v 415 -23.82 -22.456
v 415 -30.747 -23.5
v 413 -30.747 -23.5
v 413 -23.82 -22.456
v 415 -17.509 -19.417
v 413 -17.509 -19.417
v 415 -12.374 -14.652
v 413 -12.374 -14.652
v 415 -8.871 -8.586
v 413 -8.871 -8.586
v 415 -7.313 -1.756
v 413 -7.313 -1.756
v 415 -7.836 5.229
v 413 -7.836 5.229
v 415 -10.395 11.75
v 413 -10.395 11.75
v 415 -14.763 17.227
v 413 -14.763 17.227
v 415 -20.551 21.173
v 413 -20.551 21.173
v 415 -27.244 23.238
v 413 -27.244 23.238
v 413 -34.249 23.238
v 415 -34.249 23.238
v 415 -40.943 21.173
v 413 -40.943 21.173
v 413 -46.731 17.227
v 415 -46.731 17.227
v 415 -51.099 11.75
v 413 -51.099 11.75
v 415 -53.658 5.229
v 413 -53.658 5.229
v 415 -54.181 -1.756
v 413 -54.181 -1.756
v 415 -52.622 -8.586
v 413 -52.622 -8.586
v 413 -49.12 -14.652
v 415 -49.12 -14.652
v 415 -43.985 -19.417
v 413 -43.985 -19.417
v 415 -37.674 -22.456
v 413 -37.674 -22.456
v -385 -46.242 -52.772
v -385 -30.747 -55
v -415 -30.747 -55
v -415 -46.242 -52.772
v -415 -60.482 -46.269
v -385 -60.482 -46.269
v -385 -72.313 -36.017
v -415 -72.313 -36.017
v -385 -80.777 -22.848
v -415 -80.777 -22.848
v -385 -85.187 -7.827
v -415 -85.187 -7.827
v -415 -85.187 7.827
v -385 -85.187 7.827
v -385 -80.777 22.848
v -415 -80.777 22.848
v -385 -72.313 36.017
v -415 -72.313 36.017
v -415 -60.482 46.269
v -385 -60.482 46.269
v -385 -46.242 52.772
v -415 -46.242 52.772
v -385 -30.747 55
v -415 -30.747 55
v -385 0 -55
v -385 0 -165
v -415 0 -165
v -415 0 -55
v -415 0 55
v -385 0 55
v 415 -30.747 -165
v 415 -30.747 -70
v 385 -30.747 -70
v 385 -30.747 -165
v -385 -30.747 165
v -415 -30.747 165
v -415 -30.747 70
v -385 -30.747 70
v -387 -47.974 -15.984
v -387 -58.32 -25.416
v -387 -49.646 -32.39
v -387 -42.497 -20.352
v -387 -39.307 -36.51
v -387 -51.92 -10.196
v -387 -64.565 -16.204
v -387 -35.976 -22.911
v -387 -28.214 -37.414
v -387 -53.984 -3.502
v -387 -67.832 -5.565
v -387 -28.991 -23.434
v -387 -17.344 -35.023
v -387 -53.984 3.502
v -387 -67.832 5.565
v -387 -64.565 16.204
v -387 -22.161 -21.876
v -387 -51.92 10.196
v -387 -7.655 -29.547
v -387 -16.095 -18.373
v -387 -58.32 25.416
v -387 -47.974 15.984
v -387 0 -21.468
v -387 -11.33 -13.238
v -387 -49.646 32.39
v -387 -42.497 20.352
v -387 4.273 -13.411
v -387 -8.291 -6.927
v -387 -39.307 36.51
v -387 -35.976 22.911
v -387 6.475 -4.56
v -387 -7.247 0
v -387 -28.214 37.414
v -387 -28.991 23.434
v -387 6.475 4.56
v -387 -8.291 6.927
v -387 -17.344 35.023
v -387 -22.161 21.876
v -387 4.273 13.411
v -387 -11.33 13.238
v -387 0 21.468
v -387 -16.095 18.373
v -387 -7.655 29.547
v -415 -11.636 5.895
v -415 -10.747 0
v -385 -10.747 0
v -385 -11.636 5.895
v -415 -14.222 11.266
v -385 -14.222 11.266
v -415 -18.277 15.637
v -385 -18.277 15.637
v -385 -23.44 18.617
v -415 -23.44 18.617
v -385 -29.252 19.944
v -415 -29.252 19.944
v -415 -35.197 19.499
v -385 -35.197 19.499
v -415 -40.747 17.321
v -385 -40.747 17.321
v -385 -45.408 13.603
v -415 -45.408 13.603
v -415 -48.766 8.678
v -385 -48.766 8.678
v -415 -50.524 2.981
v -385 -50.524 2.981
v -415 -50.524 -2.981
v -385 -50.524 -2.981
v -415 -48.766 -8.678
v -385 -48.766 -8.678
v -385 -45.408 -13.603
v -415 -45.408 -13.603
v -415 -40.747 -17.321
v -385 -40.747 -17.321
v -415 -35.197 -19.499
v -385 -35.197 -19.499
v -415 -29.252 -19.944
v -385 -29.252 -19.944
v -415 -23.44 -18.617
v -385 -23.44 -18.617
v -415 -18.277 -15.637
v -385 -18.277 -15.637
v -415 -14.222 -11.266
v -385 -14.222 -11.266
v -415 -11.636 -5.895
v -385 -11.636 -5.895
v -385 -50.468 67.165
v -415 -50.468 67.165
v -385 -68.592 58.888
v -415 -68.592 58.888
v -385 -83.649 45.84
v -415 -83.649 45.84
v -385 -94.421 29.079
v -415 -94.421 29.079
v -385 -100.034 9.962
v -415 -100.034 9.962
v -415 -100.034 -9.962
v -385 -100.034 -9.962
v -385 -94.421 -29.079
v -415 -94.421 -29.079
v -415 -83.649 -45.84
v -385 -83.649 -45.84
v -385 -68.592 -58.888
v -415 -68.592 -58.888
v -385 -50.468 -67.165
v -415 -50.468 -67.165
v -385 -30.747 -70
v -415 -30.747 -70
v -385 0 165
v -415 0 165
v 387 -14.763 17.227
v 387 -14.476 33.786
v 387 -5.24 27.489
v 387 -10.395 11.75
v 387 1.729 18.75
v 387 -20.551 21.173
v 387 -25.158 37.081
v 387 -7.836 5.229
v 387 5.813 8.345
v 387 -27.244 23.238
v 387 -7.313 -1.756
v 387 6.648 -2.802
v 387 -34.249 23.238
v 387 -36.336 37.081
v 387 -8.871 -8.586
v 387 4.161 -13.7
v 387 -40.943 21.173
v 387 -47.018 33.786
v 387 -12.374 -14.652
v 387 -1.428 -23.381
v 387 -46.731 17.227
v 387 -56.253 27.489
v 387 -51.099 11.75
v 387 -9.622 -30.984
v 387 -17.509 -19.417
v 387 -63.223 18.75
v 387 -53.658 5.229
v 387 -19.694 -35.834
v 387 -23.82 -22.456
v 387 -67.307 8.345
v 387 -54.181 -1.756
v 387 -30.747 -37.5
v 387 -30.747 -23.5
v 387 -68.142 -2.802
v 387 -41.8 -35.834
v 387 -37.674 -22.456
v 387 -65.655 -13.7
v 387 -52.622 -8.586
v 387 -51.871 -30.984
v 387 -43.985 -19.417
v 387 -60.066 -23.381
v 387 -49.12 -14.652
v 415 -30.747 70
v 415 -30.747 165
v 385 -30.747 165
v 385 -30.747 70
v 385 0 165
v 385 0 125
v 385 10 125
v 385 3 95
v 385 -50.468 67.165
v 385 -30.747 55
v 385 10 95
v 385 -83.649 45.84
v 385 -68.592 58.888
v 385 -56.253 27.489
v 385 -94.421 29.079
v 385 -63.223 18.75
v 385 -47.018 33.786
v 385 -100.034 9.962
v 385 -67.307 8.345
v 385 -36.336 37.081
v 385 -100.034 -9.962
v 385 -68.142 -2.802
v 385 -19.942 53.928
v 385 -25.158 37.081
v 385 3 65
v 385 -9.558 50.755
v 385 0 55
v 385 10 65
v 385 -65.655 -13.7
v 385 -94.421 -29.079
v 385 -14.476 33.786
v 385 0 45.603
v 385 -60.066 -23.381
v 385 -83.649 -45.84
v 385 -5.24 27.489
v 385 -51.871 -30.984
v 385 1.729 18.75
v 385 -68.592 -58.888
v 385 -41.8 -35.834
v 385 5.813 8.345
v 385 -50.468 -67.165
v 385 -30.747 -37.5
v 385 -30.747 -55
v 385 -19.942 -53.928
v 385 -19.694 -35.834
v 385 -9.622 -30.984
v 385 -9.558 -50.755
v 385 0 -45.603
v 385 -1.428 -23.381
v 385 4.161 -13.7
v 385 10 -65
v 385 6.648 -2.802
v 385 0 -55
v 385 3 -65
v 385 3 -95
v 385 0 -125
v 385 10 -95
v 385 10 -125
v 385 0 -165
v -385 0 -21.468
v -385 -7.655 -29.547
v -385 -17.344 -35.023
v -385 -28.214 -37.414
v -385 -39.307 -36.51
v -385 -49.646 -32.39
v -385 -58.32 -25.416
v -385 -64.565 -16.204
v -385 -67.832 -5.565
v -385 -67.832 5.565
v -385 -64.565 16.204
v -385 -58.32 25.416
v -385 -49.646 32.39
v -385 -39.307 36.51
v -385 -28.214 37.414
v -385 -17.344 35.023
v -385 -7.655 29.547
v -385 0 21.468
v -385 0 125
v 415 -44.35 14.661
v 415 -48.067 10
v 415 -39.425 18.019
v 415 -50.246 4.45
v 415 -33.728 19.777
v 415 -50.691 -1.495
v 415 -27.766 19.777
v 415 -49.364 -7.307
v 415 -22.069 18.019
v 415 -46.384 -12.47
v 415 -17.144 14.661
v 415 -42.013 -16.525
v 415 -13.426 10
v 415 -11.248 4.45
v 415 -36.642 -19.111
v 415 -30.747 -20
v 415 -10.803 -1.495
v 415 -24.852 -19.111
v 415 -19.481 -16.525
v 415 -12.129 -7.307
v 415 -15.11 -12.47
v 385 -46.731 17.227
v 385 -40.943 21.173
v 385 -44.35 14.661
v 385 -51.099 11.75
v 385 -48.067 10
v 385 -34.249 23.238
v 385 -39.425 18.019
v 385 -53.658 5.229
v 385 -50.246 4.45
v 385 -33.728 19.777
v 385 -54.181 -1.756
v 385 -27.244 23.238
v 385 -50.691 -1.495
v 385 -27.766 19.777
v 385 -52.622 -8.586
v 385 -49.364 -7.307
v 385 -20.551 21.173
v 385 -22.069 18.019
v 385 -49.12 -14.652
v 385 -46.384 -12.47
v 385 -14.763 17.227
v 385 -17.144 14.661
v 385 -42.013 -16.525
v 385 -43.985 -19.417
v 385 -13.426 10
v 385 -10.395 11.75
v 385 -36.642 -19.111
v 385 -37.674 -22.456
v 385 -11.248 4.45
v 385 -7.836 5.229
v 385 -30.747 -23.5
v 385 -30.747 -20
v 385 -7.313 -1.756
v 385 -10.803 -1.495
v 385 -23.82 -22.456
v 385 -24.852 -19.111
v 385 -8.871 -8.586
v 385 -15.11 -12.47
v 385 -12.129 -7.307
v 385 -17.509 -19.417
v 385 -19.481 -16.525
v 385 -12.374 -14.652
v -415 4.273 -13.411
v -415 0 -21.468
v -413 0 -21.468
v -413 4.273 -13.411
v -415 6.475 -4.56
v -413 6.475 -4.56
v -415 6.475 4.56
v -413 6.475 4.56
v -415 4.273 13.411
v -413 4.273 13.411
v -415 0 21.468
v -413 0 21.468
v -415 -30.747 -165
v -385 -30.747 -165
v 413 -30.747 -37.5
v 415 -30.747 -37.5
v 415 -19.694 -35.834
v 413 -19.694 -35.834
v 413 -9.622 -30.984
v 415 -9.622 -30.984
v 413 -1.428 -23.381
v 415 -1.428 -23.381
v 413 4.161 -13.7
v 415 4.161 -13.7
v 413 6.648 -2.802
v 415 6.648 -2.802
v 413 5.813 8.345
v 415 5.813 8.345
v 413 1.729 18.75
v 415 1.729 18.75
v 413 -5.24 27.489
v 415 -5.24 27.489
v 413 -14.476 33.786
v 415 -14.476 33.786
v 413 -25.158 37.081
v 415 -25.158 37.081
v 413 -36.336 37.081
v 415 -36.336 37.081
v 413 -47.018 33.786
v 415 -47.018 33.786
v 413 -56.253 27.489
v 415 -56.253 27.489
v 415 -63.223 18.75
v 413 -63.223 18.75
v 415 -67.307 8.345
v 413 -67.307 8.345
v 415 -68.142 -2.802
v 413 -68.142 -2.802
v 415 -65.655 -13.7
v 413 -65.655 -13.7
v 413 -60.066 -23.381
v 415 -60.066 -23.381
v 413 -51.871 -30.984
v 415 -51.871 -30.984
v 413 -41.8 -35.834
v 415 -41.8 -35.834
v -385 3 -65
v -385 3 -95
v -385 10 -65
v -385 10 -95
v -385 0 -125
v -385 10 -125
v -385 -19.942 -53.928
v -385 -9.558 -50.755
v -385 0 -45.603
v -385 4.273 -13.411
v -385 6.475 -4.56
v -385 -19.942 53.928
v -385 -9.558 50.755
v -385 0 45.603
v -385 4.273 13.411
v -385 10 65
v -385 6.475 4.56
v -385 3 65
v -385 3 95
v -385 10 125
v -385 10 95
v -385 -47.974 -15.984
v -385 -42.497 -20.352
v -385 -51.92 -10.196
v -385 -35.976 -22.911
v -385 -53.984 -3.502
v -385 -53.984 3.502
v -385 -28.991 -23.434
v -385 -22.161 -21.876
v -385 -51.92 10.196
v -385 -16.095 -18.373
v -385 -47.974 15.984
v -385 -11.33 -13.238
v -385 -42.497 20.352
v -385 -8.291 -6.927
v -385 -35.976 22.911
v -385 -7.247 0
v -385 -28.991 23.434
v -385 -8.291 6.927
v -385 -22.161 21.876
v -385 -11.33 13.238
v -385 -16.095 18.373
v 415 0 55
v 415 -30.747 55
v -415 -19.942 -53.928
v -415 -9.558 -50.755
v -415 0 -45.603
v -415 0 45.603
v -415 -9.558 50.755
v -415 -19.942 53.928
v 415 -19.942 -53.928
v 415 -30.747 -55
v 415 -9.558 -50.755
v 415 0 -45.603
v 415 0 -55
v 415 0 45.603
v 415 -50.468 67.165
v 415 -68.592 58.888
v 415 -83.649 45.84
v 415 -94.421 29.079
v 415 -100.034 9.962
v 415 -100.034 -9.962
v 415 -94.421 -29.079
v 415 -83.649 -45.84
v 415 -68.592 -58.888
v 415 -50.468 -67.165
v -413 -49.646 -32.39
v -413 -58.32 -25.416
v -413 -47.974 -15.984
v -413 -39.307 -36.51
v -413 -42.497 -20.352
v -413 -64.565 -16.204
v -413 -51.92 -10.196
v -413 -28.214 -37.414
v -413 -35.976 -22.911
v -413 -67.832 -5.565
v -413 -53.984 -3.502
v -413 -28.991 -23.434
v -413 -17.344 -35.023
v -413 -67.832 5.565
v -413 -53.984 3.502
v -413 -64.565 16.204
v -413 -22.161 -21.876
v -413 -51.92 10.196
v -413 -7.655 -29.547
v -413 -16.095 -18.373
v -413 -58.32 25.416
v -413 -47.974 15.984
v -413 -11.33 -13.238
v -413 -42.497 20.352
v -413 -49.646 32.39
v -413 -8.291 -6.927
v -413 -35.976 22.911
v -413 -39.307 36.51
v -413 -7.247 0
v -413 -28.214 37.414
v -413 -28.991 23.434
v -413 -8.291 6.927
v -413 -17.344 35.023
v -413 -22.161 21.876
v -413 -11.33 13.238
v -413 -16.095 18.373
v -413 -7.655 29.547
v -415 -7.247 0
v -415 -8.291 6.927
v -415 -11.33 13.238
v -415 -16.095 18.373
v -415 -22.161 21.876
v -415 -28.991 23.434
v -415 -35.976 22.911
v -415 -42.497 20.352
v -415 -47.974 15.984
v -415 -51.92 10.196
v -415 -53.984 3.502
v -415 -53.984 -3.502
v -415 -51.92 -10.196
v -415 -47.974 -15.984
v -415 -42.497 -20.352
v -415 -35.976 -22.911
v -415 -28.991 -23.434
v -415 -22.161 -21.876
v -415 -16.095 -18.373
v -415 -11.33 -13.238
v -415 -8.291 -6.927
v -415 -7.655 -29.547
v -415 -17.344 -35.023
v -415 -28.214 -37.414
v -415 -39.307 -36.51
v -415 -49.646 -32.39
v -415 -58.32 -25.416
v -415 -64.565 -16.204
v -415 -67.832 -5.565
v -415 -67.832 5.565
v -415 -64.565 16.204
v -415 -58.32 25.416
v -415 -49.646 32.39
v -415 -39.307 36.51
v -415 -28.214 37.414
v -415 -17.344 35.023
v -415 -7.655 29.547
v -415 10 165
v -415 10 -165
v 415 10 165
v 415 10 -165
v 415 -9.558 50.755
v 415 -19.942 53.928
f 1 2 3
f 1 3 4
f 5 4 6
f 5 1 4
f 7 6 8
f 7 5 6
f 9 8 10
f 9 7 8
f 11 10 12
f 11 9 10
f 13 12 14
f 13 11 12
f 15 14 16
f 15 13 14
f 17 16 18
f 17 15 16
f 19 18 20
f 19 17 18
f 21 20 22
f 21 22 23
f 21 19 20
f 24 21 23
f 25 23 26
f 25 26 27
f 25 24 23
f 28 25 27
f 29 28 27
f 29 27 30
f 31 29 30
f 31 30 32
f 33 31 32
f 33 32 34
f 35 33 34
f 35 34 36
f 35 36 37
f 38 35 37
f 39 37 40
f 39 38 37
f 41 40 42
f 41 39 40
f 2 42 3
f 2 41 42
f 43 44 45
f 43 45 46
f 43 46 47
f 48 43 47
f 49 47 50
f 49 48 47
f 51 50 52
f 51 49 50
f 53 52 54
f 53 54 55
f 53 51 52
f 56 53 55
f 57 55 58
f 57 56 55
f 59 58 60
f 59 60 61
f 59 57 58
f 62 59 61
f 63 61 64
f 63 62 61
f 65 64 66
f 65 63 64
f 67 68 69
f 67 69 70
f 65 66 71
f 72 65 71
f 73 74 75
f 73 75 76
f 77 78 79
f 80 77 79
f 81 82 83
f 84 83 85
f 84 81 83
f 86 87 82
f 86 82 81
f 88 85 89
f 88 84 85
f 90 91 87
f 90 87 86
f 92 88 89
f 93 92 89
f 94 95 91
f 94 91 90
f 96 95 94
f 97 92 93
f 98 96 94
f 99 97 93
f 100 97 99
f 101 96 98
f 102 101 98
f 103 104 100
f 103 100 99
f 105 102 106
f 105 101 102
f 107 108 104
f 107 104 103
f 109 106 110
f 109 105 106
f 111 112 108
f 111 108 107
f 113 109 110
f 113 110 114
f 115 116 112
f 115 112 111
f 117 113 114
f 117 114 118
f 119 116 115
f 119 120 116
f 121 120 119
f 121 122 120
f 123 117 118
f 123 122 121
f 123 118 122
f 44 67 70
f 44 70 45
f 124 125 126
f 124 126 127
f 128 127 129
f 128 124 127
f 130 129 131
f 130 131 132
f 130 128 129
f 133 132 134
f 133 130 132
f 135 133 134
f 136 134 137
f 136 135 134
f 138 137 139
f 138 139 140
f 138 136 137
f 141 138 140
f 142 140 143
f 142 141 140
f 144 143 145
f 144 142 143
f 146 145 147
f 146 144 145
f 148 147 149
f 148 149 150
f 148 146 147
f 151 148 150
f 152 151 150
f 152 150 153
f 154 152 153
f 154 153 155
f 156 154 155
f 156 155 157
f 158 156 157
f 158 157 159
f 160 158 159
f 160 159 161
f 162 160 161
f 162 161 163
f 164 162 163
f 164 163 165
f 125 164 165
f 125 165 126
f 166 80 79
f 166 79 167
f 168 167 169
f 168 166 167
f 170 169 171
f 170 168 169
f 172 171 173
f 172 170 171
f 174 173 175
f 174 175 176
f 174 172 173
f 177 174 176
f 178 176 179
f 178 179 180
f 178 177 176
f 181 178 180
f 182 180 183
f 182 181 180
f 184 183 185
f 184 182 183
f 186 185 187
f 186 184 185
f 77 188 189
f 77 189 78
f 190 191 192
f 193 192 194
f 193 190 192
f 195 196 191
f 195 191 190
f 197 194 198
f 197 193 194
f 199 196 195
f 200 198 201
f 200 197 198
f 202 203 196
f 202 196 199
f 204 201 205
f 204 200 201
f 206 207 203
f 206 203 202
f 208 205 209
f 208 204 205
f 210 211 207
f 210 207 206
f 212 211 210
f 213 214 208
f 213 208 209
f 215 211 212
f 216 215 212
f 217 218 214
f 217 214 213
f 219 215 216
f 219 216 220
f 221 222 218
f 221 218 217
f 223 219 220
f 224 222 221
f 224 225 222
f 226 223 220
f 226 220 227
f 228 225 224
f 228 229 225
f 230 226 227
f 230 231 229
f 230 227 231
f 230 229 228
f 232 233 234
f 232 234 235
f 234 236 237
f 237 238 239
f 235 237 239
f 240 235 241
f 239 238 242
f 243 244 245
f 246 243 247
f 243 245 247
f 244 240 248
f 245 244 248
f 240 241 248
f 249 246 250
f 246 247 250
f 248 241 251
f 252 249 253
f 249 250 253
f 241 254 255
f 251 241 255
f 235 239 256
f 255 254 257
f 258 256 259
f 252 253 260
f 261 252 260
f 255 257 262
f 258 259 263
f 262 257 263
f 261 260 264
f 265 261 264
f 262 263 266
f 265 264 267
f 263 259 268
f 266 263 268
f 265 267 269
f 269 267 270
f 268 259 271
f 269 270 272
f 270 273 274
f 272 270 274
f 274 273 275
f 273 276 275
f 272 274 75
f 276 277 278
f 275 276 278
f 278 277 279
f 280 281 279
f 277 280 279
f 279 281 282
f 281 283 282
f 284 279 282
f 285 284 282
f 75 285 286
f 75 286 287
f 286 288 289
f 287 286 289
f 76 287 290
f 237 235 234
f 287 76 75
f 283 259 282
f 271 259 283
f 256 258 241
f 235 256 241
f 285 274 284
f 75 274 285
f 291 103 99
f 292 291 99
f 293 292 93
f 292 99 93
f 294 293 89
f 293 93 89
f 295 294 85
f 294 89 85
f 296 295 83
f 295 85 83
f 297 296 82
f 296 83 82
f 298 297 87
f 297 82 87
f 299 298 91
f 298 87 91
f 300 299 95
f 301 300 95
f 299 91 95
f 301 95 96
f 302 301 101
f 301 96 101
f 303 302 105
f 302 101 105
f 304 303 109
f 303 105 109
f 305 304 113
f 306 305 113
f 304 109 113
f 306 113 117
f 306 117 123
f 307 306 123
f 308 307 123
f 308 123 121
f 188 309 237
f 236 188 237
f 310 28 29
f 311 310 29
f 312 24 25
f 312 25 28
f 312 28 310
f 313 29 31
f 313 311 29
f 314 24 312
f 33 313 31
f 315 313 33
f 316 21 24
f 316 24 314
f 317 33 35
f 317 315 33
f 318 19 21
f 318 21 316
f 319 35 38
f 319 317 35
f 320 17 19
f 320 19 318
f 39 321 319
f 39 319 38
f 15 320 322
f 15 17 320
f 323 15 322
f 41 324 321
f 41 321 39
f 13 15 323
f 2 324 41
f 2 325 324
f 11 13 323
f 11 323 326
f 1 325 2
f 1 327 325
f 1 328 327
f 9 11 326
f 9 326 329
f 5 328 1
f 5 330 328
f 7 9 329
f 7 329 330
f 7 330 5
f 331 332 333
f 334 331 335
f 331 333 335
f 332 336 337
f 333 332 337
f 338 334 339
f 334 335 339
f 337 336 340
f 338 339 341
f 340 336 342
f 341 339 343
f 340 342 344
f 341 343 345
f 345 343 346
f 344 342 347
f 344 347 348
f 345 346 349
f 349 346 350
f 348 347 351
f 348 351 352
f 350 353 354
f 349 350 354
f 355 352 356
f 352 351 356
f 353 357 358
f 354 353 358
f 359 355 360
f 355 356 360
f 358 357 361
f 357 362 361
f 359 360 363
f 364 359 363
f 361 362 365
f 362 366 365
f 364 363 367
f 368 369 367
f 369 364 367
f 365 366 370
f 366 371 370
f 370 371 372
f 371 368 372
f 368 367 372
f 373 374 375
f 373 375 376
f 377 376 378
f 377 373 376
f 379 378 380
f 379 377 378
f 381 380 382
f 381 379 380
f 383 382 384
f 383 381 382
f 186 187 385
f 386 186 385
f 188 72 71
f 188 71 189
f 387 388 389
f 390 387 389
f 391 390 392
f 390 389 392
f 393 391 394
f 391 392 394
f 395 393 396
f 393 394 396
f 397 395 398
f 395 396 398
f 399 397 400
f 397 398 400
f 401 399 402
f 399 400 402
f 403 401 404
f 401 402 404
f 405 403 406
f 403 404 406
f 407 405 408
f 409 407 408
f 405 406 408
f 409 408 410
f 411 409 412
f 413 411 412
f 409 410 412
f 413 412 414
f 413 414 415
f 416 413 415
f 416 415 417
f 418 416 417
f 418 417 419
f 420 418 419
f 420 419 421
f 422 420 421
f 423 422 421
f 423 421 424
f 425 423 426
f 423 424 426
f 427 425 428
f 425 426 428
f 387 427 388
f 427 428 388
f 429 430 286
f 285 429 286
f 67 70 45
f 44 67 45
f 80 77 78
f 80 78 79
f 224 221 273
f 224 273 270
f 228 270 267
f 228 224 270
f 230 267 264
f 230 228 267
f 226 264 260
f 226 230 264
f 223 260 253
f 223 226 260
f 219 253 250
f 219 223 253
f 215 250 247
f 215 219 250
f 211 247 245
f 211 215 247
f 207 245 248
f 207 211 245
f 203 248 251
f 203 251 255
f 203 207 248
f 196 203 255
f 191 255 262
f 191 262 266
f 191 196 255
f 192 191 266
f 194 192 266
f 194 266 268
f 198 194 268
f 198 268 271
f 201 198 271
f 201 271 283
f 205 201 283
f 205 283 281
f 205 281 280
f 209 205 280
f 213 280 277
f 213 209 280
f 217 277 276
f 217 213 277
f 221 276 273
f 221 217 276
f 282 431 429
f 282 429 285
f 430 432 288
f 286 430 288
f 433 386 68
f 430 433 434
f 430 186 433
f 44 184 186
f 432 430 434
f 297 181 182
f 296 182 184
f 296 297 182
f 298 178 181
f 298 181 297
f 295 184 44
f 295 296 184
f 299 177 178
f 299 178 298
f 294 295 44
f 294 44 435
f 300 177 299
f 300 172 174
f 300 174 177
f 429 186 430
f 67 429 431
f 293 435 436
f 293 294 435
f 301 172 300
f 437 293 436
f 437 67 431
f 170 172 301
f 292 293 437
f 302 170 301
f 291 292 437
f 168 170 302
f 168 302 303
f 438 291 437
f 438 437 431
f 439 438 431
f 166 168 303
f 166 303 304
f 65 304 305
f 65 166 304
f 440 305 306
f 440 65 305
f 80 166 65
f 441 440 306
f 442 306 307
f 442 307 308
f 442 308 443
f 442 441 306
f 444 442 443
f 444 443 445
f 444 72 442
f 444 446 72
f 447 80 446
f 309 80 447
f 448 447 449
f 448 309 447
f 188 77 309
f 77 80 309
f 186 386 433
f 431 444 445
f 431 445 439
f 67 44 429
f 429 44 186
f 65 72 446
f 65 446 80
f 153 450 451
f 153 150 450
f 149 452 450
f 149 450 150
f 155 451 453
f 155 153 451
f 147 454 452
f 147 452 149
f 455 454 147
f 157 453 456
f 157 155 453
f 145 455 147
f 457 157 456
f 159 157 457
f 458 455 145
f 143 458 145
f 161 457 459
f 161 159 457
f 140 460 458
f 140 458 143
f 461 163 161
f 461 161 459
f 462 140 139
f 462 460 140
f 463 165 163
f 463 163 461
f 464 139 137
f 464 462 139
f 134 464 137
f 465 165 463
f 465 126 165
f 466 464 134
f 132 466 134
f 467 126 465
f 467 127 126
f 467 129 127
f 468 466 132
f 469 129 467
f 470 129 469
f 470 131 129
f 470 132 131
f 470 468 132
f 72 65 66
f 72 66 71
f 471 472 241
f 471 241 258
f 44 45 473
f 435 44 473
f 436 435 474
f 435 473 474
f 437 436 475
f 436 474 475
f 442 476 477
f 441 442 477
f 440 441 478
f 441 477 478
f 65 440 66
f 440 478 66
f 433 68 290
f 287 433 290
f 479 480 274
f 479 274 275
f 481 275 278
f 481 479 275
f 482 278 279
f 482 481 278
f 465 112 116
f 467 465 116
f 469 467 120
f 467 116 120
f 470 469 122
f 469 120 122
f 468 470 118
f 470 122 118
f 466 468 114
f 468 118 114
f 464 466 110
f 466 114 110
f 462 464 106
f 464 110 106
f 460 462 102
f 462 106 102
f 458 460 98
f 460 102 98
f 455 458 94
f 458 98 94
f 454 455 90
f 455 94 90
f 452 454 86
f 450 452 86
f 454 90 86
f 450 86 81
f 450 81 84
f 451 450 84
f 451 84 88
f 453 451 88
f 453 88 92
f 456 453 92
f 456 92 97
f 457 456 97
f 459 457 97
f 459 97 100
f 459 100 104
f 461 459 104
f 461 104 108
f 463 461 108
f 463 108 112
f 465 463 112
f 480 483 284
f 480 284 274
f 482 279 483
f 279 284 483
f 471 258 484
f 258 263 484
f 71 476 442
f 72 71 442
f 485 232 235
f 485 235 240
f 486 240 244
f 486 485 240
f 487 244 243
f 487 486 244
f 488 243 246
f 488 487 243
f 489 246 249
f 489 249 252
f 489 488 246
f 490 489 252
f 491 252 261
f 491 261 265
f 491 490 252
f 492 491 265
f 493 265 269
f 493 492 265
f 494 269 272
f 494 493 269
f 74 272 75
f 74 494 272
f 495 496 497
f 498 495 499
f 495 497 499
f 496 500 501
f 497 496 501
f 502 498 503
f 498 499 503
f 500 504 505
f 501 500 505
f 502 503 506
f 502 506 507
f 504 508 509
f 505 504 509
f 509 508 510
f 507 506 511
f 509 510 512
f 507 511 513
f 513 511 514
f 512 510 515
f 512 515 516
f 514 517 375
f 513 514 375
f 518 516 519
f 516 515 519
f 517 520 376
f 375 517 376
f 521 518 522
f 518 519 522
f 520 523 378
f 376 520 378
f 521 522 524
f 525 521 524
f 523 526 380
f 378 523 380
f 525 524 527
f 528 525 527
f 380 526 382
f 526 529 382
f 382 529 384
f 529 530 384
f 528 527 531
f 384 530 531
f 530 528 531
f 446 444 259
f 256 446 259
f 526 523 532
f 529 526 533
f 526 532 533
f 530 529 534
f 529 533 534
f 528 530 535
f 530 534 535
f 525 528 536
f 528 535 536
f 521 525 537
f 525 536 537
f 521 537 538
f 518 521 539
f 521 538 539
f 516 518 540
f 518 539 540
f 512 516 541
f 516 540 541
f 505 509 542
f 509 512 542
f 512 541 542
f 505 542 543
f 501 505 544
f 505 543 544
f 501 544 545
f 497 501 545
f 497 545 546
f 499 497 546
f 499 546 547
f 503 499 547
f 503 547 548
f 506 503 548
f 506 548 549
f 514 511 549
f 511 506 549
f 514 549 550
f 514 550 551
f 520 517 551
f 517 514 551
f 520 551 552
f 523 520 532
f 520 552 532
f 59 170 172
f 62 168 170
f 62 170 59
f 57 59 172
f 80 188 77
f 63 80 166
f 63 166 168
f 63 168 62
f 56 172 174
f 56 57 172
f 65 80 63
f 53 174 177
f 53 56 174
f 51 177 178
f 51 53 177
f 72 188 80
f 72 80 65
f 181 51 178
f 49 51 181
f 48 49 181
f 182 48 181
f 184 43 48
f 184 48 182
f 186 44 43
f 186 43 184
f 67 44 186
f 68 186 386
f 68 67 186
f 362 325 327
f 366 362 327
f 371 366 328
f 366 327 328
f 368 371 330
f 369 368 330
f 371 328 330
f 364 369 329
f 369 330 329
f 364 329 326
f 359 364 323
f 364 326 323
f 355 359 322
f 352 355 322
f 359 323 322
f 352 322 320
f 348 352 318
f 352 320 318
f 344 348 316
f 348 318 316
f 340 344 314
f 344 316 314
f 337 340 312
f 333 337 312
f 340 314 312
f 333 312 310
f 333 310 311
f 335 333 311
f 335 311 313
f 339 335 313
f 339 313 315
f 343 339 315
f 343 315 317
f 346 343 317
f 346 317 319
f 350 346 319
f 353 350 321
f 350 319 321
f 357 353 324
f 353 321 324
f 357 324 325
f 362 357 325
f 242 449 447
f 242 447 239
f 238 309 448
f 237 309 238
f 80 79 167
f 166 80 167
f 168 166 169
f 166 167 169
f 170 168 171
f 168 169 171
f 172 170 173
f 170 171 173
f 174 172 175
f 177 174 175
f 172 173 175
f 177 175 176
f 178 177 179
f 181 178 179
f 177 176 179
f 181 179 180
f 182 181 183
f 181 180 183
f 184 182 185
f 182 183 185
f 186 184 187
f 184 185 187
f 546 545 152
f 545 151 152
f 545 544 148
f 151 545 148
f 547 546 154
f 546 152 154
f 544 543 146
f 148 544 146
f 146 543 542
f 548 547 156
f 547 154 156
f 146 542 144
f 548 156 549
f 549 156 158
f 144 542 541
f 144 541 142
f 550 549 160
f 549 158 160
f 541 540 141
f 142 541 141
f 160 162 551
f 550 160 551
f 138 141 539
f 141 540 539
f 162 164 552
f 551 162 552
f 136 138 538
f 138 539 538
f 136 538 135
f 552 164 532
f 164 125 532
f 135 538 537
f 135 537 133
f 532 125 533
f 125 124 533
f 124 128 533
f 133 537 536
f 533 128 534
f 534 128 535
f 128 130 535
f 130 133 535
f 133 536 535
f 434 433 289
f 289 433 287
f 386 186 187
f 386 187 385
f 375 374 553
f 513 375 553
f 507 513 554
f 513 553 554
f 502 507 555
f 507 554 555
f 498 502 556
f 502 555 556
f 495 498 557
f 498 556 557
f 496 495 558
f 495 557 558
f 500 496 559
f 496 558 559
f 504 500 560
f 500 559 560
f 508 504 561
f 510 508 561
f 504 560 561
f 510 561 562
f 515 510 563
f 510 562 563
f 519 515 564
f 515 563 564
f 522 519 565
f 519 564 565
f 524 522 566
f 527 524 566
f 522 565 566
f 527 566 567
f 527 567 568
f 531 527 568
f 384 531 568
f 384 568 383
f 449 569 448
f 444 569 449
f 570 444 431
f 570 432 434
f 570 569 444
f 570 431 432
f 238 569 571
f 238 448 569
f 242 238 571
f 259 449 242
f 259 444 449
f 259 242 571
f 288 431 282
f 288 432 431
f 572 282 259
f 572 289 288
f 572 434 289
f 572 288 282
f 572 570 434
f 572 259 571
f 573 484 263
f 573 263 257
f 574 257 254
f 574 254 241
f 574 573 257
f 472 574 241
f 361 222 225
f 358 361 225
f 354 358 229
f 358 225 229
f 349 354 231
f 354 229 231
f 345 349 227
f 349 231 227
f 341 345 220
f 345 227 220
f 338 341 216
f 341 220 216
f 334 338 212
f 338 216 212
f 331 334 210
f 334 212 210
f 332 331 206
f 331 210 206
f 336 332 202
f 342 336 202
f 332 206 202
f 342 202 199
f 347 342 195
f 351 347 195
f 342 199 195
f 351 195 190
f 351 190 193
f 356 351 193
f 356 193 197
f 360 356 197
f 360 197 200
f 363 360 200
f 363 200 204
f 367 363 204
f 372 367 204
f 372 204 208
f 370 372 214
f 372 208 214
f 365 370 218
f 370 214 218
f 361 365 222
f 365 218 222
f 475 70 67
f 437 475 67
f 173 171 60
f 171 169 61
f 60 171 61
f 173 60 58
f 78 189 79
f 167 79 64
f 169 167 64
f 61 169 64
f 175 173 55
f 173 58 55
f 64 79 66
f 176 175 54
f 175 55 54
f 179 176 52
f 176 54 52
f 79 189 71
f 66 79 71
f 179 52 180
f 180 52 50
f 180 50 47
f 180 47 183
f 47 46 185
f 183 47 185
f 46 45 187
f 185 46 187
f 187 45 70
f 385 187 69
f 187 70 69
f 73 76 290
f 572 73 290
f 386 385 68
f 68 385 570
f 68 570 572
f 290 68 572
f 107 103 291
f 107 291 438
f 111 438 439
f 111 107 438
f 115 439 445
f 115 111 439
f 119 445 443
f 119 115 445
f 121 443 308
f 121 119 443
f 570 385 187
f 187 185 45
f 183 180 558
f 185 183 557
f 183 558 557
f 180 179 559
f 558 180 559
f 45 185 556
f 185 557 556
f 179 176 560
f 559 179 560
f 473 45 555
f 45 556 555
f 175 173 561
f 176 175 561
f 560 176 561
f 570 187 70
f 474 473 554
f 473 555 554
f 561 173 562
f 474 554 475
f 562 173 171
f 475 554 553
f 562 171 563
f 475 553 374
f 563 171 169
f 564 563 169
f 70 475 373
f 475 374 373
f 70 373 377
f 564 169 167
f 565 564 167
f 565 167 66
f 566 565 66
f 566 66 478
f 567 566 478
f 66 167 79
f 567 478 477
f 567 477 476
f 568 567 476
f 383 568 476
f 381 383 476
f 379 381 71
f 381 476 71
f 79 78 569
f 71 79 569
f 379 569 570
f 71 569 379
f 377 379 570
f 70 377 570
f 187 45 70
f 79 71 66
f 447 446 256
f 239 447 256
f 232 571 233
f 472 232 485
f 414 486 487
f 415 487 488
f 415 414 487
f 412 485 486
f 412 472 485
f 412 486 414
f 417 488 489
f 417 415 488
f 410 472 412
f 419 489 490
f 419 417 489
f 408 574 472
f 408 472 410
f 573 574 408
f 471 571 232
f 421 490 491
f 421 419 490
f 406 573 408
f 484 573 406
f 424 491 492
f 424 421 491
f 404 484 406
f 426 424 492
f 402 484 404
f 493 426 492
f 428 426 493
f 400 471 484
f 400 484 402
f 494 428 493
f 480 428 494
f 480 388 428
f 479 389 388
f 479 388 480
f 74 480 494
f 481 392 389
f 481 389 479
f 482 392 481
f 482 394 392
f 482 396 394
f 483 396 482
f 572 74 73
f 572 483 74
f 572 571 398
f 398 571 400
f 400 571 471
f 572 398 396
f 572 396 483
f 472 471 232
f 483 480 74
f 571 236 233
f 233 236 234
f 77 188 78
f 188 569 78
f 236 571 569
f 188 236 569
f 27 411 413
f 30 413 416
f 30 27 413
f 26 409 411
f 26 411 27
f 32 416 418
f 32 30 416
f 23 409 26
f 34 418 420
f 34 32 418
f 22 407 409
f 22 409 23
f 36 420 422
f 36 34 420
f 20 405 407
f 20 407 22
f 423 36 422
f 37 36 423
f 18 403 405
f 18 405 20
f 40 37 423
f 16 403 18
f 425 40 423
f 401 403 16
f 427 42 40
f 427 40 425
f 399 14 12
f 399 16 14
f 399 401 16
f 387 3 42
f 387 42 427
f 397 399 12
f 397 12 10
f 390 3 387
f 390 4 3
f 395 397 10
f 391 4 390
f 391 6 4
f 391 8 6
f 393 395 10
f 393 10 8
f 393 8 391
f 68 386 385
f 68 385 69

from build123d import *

# Parameters (mm, degrees)
SKETCH3_W               = 830
SKETCH3_H               = 330
SKETCH3_W_2             = 770
SKETCH3_H_2             = 250
BOSS_EXTRUDE1_DEPTH     = 10
SKETCH4_W               = 770
SKETCH4_H               = 30
BOSS_EXTRUDE2_DEPTH     = 7
BOSS_EXTRUDE4_DEPTH     = 30
LPATTERN1_COUNT         = 2
LPATTERN1_PITCH         = 800
SKETCH7_R               = 20
BOSS_EXTRUDE5_DEPTH     = 30
SKETCH9_R               = 37.5
SKETCH9_R_2             = 23.5
CUT_EXTRUDE1_DEPTH      = 2
CUT_EXTRUDE2_START      = -2
SKETCH10_R              = 37.5
SKETCH10_R_2            = 23.5
CUT_EXTRUDE2_DEPTH      = 2
LPATTERN3_START         = -415
LPATTERN3_DEPTH         = 2
LPATTERN3_START_2       = -387
LPATTERN3_2_DEPTH       = 2
LPATTERN3_START_3       = -413
LPATTERN3_3_OUTLINE_R   = 20
LPATTERN3_3_DEPTH       = 26
LPATTERN3_4_OUTLINE_R   = 23.5
LPATTERN3_4_OUTLINE_R_2 = 20
LPATTERN3_4_DEPTH       = 30


# Read off the part's stored shape, not the designer's step: LPattern3
with BuildPart() as part:
    # Sketch3 → Boss-Extrude1 (new body)
    with BuildSketch(Plane(origin=(0, 0, 0), x_dir=(1, 0, 0), z_dir=(0, 1, 0))):
        Rectangle(SKETCH3_W, SKETCH3_H)
        Rectangle(SKETCH3_W_2, SKETCH3_H_2, mode=Mode.SUBTRACT)
    extrude(amount=BOSS_EXTRUDE1_DEPTH)

    # Sketch4 → Boss-Extrude2 (add)
    with BuildSketch(Plane(origin=(0, 10, 0), x_dir=(1, 0, 0), z_dir=(0, 1, 0))):
        with Locations((0, 80)):
            Rectangle(SKETCH4_W, SKETCH4_H)
        with Locations((0, -80)):
            Rectangle(SKETCH4_W, SKETCH4_H)
    extrude(amount=-BOSS_EXTRUDE2_DEPTH)



with BuildPart() as body_2:
    # Sketch5 → Boss-Extrude4 (new body)
    with BuildSketch(Plane(origin=(415, 0, 0), x_dir=(0, 0, -1), z_dir=(1, 0, 0))):
        with BuildLine():
            ThreePointArc((55, -30.746966092), (0, -85.746966092), (-55, -30.746966092))
            Line((-55, -30.746966092), (-70, -30.746966092))
            ThreePointArc((-70, -30.746966092), (0, -100.746966092), (70, -30.746966092))
            Line((70, -30.746966092), (55, -30.746966092))
        make_face()
        Polygon((-55, 0), (-165, 0), (-165, -30.746966092), (-70, -30.746966092), (-55, -30.746966092), align=None)
        Polygon((165, 0), (55, 0), (55, -30.746966092), (70, -30.746966092), (165, -30.746966092), align=None)
    boss_extrude4 = extrude(amount=-BOSS_EXTRUDE4_DEPTH)


with BuildPart() as lpattern1_1:
    # LPattern1: Boss-Extrude4 ×2
    with Locations(*[(-i * LPATTERN1_PITCH, 0, 0) for i in range(1, LPATTERN1_COUNT)]):
        add(boss_extrude4)


with BuildPart() as part_1:
    add(part.part)

    add(body_2.part)  # Boss-Extrude5 merges body 2
    # Sketch7 → Boss-Extrude5 (add)
    with BuildSketch(Plane(origin=(415, 0, 0), x_dir=(0, 0, -1), z_dir=(1, 0, 0))):
        with BuildLine():
            Line((45.60289548, 0), (-45.60289548, 0))
            ThreePointArc((-45.60289548, 0), (0, -85.746966092), (45.60289548, 0))
        make_face()
        with Locations((0, -30.746966092)):
            Circle(SKETCH7_R, mode=Mode.SUBTRACT)
    extrude(amount=-BOSS_EXTRUDE5_DEPTH)

    # Sketch9 → Cut-Extrude1 (cut)
    with BuildSketch(Plane(origin=(415, 0, 0), x_dir=(0, 0, -1), z_dir=(1, 0, 0))):
        with Locations((0, -30.746966092)):
            Circle(SKETCH9_R)
        with Locations((0, -30.746966092)):
            Circle(SKETCH9_R_2, mode=Mode.SUBTRACT)
    extrude(amount=-CUT_EXTRUDE1_DEPTH, mode=Mode.SUBTRACT)

    # Sketch10 → Cut-Extrude2 (cut)
    with BuildSketch(Plane.ZY.offset(-385).offset(CUT_EXTRUDE2_START)):
        with Locations(Location((0, -30.746966092, 0), (0, 0, 180))):
            Circle(SKETCH10_R)
        with Locations(Location((0, -30.746966092, 0), (0, 0, 180))):
            Circle(SKETCH10_R_2, mode=Mode.SUBTRACT)
    extrude(amount=CUT_EXTRUDE2_DEPTH, mode=Mode.SUBTRACT)

    # LPattern3 outline → LPattern3 (cut)
    with BuildSketch(Plane.YZ.offset(LPATTERN3_START)):
        with BuildLine():
            ThreePointArc((0, -21.467977924), (6.753033908, 0), (0, 21.467977924))
            Line((0, 21.467977924), (0, -21.467977924))
        make_face()
    extrude(amount=LPATTERN3_DEPTH, mode=Mode.SUBTRACT)

    # LPattern3 2 outline → LPattern3 2 (cut)
    with BuildSketch(Plane.YZ.offset(LPATTERN3_START_2)):
        with BuildLine():
            ThreePointArc((0, -21.467977924), (6.753033908, 0), (0, 21.467977924))
            Line((0, 21.467977924), (0, -21.467977924))
        make_face()
    extrude(amount=LPATTERN3_2_DEPTH, mode=Mode.SUBTRACT)

    # LPattern3 3 outline → LPattern3 3 (add)
    with BuildSketch(Plane.YZ.offset(LPATTERN3_START_3)):
        with BuildLine():
            Line((-30.746966092, 165), (-30.746966092, 70))
            ThreePointArc((-30.746966092, 70), (-100.746966092, 0), (-30.746966092, -70))
            Line((-30.746966092, -70), (-30.746966092, -165))
            Line((-30.746966092, -165), (0, -165))
            Line((0, -165), (0, -55))
            Line((0, -55), (-30.746966092, -55))
            ThreePointArc((-30.746966092, -55), (-14.671507333, -52.598285387), (0, -45.60289548))
            Line((0, -45.60289548), (0, 45.60289548))
            ThreePointArc((0, 45.60289548), (-14.671507333, 52.598285387), (-30.746966092, 55))
            Line((-30.746966092, 55), (0, 55))
            Line((0, 55), (0, 165))
            Line((0, 165), (-30.746966092, 165))
        make_face()
        with Locations((-30.746966092, 0)):
            Circle(LPATTERN3_3_OUTLINE_R, mode=Mode.SUBTRACT)
    extrude(amount=LPATTERN3_3_DEPTH)

    # LPattern3 4 outline → LPattern3 4 (add)
    # profile 1 of 2: a face of its own
    with BuildSketch(Plane.YZ.offset(LPATTERN3_START)):
        with BuildLine():
            Line((-30.746966092, 165), (-30.746966092, 70))
            ThreePointArc((-30.746966092, 70), (-100.746966092, 0), (-30.746966092, -70))
            Line((-30.746966092, -70), (-30.746966092, -165))
            Line((-30.746966092, -165), (0, -165))
            Line((0, -165), (0, -55))
            Line((0, -55), (-30.746966092, -55))
            ThreePointArc((-30.746966092, -55), (-14.671507333, -52.598285387), (0, -45.60289548))
            Line((0, -45.60289548), (0, -21.467977924))
            ThreePointArc((0, -21.467977924), (-68.246966092, 0), (0, 21.467977924))
            Line((0, 21.467977924), (0, 45.60289548))
            ThreePointArc((0, 45.60289548), (-14.671507333, 52.598285387), (-30.746966092, 55))
            Line((-30.746966092, 55), (0, 55))
            Line((0, 55), (0, 165))
            Line((0, 165), (-30.746966092, 165))
        make_face()
    # profile 2 of 2: a face of its own
    with BuildSketch(Plane.YZ.offset(LPATTERN3_START)):
        with Locations((-30.746966092, 0)):
            Circle(LPATTERN3_4_OUTLINE_R)
        with Locations((-30.746966092, 0)):
            Circle(LPATTERN3_4_OUTLINE_R_2, mode=Mode.SUBTRACT)
    extrude(amount=LPATTERN3_4_DEPTH)


solid = Compound([lpattern1_1.part, part_1.part])
